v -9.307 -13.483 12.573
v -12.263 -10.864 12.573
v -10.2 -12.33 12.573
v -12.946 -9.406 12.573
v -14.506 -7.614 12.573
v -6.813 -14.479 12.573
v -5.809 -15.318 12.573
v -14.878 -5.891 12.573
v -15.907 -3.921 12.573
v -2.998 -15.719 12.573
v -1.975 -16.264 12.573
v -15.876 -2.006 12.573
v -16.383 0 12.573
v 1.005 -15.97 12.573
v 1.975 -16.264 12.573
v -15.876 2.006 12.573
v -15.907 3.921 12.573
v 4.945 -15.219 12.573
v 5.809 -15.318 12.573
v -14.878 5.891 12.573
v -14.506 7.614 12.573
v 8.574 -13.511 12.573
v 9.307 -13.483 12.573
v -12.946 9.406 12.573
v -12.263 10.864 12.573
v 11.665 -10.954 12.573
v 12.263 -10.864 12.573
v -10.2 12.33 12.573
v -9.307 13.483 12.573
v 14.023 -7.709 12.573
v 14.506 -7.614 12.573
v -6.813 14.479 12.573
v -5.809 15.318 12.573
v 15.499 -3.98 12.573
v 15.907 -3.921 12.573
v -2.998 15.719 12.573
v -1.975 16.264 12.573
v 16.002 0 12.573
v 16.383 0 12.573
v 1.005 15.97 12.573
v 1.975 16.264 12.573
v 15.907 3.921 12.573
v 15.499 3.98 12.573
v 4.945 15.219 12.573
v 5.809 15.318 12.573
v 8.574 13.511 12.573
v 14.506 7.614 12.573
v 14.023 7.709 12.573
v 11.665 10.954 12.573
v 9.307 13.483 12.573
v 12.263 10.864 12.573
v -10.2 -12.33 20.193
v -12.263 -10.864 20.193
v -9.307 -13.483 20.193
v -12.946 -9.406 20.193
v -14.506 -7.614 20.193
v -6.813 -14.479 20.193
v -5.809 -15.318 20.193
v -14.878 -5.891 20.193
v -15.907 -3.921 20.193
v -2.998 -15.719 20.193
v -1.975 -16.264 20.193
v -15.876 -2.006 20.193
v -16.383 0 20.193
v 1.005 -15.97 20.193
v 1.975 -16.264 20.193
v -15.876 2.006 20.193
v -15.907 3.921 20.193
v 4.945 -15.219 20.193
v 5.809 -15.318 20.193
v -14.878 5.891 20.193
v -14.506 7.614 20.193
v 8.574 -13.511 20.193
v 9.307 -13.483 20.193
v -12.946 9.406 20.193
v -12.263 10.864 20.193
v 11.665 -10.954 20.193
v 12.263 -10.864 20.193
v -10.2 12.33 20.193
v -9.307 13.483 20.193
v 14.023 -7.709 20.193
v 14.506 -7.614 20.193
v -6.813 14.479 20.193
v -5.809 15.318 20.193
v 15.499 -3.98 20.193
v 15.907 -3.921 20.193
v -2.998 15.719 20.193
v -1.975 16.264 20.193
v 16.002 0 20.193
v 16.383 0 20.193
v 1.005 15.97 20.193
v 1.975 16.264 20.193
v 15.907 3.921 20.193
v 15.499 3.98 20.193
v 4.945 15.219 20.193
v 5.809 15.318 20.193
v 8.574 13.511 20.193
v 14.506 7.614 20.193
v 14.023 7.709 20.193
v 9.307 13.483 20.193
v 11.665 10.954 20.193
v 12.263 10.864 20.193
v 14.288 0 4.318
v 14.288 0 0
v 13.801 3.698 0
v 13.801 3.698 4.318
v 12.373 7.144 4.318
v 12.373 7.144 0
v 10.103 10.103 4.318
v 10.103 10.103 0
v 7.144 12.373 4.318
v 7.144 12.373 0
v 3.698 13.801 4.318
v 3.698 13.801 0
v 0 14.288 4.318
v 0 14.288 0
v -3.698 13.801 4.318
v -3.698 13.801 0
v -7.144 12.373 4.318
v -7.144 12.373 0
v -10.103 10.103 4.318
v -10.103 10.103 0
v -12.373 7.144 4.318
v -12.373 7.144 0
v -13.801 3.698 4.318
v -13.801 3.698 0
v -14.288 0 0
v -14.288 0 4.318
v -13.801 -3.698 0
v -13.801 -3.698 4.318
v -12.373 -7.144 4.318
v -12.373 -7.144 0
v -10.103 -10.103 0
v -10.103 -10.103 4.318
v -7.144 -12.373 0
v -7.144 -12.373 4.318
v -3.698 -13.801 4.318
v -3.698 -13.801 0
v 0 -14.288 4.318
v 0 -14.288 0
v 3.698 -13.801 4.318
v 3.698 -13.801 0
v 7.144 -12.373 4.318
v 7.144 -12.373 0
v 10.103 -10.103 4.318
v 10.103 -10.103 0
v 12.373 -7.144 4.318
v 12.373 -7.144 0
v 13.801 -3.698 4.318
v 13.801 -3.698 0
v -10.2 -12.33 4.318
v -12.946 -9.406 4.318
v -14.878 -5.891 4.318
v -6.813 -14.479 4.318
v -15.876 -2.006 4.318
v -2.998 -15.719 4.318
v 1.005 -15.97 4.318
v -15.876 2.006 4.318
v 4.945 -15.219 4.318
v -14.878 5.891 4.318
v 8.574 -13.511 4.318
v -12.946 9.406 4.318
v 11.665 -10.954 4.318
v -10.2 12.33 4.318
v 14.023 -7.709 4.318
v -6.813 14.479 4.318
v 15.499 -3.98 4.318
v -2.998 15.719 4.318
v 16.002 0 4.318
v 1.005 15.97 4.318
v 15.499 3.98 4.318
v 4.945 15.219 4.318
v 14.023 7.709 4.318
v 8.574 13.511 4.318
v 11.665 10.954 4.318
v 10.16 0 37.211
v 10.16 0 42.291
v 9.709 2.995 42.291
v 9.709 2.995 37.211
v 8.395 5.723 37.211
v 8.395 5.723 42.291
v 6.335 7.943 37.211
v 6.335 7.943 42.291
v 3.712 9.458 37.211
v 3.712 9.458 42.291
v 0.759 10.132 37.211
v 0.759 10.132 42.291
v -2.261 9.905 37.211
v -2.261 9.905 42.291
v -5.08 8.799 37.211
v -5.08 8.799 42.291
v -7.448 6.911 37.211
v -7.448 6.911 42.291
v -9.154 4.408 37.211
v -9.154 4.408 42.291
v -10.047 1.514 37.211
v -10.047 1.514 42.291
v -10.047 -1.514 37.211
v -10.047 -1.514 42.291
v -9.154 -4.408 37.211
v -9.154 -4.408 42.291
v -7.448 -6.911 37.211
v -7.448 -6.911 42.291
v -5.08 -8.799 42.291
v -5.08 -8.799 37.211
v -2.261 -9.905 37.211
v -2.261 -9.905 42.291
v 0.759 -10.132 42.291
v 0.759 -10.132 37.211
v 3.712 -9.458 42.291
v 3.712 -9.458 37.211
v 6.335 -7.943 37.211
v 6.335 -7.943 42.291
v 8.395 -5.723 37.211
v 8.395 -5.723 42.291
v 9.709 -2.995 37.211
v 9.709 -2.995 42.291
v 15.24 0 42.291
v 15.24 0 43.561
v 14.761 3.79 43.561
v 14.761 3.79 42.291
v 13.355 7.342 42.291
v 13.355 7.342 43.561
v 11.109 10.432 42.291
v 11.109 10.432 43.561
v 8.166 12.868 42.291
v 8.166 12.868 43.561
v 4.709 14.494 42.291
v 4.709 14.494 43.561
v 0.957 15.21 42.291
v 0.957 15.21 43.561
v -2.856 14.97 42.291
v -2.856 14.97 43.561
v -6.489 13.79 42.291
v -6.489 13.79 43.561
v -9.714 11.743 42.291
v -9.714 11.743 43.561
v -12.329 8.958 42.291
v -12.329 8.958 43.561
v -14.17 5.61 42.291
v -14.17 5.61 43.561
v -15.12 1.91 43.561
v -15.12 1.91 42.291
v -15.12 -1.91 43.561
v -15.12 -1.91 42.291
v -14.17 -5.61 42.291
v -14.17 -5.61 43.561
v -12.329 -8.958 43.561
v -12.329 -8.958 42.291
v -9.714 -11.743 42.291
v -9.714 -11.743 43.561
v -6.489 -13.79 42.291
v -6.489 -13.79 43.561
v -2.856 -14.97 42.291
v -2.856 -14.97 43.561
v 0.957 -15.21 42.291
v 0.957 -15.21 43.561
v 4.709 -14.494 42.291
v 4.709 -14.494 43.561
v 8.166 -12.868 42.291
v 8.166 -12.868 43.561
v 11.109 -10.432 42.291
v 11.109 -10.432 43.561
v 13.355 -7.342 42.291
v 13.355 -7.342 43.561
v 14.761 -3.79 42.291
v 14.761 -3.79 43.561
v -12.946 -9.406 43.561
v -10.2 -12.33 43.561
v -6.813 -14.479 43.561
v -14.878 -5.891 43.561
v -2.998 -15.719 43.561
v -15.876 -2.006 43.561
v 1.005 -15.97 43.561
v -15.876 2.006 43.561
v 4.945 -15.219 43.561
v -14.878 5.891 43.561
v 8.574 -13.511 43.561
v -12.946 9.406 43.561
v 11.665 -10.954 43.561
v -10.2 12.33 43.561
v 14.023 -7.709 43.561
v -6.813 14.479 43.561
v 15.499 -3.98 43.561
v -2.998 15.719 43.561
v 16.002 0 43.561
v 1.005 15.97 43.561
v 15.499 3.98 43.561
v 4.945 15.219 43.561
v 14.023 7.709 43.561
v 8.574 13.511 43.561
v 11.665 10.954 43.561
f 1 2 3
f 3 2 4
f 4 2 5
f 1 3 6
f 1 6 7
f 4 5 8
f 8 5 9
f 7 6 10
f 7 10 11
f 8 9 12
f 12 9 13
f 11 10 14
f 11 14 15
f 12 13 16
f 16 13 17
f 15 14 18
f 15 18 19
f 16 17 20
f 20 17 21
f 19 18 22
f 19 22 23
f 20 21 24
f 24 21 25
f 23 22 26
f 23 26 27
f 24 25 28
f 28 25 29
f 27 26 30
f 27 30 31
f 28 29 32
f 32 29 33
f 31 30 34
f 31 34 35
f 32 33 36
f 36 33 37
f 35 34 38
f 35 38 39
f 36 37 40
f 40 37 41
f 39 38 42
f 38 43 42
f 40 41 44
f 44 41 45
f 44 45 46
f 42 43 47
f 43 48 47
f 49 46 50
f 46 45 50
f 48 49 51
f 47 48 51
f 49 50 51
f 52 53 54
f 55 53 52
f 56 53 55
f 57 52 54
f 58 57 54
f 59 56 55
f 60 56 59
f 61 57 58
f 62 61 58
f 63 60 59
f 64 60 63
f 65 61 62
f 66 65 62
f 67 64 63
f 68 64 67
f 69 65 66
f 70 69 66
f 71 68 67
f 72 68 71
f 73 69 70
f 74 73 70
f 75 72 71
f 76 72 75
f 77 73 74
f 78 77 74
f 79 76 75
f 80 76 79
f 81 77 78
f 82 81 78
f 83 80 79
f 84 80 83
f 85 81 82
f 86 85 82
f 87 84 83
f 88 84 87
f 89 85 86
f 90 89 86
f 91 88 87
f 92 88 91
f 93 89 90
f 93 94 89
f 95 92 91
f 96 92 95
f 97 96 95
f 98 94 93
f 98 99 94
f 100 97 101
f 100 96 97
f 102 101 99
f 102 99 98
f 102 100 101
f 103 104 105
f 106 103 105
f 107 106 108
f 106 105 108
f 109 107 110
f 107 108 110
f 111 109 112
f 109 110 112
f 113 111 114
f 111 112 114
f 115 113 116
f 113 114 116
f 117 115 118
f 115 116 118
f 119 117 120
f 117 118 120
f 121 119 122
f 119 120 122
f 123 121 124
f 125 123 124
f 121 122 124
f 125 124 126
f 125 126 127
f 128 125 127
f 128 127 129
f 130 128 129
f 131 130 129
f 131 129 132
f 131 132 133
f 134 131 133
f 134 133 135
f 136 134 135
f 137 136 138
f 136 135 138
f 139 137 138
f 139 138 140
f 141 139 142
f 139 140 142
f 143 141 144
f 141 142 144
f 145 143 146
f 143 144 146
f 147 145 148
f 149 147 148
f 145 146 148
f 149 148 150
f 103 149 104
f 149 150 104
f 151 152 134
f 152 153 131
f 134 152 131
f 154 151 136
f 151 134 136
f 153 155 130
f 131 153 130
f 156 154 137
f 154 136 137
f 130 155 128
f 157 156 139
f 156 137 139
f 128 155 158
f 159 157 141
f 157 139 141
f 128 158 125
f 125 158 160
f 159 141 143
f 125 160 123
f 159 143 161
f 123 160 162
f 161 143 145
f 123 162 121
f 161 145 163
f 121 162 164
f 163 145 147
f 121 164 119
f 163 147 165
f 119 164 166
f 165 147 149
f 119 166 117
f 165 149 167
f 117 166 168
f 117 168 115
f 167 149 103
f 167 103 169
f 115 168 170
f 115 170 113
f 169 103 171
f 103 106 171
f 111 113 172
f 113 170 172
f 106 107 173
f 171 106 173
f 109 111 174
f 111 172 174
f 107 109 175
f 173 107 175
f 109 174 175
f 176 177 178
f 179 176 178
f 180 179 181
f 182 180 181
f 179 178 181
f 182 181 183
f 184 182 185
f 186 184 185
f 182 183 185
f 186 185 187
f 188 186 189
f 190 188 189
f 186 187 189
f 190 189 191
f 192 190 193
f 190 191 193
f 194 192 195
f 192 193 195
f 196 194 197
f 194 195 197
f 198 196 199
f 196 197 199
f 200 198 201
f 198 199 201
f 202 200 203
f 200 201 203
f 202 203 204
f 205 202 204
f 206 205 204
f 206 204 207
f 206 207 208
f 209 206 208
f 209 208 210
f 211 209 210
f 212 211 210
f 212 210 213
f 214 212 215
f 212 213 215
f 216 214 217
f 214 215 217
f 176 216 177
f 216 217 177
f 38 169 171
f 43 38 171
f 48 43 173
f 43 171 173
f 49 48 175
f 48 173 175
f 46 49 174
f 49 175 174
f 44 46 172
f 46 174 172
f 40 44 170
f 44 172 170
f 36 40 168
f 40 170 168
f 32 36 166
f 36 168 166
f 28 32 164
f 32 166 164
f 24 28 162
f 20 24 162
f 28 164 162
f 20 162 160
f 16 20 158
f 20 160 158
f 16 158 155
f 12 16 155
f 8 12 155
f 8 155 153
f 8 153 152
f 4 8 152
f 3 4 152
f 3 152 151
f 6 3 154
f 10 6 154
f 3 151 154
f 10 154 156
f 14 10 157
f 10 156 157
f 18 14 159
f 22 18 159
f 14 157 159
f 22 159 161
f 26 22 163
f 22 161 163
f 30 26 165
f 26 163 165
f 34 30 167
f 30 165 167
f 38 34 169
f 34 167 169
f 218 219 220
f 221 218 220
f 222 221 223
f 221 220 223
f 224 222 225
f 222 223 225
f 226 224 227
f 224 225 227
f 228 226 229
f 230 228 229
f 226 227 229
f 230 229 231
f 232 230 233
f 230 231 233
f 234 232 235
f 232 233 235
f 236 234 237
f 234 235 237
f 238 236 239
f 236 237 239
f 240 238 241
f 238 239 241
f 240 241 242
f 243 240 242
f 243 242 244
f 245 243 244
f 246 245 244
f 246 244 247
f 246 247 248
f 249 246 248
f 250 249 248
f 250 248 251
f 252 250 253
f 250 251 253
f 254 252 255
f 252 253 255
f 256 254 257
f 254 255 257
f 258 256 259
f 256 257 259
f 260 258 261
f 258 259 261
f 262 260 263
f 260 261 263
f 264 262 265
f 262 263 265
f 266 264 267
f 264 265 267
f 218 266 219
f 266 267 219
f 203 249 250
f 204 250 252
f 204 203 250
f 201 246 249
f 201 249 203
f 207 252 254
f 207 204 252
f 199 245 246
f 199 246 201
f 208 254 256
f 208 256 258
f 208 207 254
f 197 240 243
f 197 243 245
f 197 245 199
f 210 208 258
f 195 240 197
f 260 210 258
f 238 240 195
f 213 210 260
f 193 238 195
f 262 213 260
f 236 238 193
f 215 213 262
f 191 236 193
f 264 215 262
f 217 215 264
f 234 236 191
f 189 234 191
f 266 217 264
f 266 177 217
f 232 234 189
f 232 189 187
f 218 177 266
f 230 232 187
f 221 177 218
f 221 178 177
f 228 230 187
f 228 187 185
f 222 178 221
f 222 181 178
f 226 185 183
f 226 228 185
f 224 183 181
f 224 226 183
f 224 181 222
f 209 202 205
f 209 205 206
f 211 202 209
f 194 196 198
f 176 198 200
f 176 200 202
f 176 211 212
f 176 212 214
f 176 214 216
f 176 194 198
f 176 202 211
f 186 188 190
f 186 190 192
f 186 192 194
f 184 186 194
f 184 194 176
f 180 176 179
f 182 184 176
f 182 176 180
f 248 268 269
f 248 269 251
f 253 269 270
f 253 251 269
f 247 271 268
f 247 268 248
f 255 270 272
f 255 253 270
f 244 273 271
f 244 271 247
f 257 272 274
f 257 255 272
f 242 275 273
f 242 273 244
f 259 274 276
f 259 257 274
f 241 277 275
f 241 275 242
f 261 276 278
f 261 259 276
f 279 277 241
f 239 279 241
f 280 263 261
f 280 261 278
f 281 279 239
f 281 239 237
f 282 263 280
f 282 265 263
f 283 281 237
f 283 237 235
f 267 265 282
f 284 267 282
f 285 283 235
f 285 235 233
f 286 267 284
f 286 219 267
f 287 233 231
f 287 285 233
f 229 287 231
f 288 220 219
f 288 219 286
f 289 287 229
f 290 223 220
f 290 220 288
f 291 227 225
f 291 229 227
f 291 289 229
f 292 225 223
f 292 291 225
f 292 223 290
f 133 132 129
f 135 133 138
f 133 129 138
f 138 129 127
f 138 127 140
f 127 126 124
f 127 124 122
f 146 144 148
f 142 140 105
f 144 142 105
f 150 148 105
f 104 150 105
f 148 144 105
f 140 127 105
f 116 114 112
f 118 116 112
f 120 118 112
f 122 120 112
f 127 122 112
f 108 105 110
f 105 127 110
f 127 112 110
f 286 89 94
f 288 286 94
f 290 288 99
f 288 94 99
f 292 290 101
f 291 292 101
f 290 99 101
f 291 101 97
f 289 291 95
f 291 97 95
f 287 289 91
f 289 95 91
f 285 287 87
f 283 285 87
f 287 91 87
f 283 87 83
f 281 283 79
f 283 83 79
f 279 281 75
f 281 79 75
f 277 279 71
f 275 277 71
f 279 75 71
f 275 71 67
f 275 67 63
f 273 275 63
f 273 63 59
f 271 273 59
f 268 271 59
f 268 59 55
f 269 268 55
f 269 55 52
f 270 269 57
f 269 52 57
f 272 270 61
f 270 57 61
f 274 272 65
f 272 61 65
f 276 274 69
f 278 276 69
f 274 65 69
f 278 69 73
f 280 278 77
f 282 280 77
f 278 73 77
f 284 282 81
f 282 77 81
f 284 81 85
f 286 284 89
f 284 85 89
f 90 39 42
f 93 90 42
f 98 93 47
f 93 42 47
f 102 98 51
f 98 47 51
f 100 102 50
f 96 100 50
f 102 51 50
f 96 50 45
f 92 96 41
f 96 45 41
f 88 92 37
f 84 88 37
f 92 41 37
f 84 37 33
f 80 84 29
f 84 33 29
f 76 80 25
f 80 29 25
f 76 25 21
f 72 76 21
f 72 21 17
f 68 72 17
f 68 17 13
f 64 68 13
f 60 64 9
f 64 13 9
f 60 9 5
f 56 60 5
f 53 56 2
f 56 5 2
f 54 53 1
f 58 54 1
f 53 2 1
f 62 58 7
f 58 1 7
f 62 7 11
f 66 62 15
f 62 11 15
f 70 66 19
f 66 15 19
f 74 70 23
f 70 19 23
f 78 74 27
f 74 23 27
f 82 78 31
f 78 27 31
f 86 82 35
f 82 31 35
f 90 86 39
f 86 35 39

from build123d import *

# Parameters (mm, degrees)
SKETCH1_R          = 14.2875
EXTRUDE1_DEPTH     = 4.318
SKETCH2_R          = 16.002
EXTRUDE2_DEPTH     = 8.255
SKETCH3_R          = 16.383
EXTRUDE3_DEPTH     = 7.62
SKETCH4_R          = 16.002
EXTRUDE4_DEPTH     = 23.368
SKETCH5_R          = 15.24
CUT_EXTRUDE1_DEPTH = 1.27
SKETCH6_R          = 10.16
CUT_EXTRUDE2_DEPTH = 5.08


with BuildPart() as part:
    # Sketch1 → Extrude1 (new body)
    with BuildSketch(Plane.XY):
        Circle(SKETCH1_R)
    extrude(amount=EXTRUDE1_DEPTH)

    # Sketch2 → Extrude2 (add)
    with BuildSketch(Plane.XY.offset(4.318)):
        Circle(SKETCH2_R)
    extrude(amount=EXTRUDE2_DEPTH)

    # Sketch3 → Extrude3 (add)
    with BuildSketch(Plane.XY.offset(12.573)):
        Circle(SKETCH3_R)
    extrude(amount=EXTRUDE3_DEPTH)

    # Sketch4 → Extrude4 (add)
    with BuildSketch(Plane.XY.offset(20.193)):
        Circle(SKETCH4_R)
    extrude(amount=EXTRUDE4_DEPTH)

    # Sketch5 → Cut-Extrude1 (cut)
    with BuildSketch(Plane.XY.offset(43.561)):
        Circle(SKETCH5_R)
    extrude(amount=-CUT_EXTRUDE1_DEPTH, mode=Mode.SUBTRACT)

    # Sketch6 → Cut-Extrude2 (cut)
    with BuildSketch(Plane.XY.offset(42.291)):
        Circle(SKETCH6_R)
    extrude(amount=-CUT_EXTRUDE2_DEPTH, mode=Mode.SUBTRACT)


solid = part.part
